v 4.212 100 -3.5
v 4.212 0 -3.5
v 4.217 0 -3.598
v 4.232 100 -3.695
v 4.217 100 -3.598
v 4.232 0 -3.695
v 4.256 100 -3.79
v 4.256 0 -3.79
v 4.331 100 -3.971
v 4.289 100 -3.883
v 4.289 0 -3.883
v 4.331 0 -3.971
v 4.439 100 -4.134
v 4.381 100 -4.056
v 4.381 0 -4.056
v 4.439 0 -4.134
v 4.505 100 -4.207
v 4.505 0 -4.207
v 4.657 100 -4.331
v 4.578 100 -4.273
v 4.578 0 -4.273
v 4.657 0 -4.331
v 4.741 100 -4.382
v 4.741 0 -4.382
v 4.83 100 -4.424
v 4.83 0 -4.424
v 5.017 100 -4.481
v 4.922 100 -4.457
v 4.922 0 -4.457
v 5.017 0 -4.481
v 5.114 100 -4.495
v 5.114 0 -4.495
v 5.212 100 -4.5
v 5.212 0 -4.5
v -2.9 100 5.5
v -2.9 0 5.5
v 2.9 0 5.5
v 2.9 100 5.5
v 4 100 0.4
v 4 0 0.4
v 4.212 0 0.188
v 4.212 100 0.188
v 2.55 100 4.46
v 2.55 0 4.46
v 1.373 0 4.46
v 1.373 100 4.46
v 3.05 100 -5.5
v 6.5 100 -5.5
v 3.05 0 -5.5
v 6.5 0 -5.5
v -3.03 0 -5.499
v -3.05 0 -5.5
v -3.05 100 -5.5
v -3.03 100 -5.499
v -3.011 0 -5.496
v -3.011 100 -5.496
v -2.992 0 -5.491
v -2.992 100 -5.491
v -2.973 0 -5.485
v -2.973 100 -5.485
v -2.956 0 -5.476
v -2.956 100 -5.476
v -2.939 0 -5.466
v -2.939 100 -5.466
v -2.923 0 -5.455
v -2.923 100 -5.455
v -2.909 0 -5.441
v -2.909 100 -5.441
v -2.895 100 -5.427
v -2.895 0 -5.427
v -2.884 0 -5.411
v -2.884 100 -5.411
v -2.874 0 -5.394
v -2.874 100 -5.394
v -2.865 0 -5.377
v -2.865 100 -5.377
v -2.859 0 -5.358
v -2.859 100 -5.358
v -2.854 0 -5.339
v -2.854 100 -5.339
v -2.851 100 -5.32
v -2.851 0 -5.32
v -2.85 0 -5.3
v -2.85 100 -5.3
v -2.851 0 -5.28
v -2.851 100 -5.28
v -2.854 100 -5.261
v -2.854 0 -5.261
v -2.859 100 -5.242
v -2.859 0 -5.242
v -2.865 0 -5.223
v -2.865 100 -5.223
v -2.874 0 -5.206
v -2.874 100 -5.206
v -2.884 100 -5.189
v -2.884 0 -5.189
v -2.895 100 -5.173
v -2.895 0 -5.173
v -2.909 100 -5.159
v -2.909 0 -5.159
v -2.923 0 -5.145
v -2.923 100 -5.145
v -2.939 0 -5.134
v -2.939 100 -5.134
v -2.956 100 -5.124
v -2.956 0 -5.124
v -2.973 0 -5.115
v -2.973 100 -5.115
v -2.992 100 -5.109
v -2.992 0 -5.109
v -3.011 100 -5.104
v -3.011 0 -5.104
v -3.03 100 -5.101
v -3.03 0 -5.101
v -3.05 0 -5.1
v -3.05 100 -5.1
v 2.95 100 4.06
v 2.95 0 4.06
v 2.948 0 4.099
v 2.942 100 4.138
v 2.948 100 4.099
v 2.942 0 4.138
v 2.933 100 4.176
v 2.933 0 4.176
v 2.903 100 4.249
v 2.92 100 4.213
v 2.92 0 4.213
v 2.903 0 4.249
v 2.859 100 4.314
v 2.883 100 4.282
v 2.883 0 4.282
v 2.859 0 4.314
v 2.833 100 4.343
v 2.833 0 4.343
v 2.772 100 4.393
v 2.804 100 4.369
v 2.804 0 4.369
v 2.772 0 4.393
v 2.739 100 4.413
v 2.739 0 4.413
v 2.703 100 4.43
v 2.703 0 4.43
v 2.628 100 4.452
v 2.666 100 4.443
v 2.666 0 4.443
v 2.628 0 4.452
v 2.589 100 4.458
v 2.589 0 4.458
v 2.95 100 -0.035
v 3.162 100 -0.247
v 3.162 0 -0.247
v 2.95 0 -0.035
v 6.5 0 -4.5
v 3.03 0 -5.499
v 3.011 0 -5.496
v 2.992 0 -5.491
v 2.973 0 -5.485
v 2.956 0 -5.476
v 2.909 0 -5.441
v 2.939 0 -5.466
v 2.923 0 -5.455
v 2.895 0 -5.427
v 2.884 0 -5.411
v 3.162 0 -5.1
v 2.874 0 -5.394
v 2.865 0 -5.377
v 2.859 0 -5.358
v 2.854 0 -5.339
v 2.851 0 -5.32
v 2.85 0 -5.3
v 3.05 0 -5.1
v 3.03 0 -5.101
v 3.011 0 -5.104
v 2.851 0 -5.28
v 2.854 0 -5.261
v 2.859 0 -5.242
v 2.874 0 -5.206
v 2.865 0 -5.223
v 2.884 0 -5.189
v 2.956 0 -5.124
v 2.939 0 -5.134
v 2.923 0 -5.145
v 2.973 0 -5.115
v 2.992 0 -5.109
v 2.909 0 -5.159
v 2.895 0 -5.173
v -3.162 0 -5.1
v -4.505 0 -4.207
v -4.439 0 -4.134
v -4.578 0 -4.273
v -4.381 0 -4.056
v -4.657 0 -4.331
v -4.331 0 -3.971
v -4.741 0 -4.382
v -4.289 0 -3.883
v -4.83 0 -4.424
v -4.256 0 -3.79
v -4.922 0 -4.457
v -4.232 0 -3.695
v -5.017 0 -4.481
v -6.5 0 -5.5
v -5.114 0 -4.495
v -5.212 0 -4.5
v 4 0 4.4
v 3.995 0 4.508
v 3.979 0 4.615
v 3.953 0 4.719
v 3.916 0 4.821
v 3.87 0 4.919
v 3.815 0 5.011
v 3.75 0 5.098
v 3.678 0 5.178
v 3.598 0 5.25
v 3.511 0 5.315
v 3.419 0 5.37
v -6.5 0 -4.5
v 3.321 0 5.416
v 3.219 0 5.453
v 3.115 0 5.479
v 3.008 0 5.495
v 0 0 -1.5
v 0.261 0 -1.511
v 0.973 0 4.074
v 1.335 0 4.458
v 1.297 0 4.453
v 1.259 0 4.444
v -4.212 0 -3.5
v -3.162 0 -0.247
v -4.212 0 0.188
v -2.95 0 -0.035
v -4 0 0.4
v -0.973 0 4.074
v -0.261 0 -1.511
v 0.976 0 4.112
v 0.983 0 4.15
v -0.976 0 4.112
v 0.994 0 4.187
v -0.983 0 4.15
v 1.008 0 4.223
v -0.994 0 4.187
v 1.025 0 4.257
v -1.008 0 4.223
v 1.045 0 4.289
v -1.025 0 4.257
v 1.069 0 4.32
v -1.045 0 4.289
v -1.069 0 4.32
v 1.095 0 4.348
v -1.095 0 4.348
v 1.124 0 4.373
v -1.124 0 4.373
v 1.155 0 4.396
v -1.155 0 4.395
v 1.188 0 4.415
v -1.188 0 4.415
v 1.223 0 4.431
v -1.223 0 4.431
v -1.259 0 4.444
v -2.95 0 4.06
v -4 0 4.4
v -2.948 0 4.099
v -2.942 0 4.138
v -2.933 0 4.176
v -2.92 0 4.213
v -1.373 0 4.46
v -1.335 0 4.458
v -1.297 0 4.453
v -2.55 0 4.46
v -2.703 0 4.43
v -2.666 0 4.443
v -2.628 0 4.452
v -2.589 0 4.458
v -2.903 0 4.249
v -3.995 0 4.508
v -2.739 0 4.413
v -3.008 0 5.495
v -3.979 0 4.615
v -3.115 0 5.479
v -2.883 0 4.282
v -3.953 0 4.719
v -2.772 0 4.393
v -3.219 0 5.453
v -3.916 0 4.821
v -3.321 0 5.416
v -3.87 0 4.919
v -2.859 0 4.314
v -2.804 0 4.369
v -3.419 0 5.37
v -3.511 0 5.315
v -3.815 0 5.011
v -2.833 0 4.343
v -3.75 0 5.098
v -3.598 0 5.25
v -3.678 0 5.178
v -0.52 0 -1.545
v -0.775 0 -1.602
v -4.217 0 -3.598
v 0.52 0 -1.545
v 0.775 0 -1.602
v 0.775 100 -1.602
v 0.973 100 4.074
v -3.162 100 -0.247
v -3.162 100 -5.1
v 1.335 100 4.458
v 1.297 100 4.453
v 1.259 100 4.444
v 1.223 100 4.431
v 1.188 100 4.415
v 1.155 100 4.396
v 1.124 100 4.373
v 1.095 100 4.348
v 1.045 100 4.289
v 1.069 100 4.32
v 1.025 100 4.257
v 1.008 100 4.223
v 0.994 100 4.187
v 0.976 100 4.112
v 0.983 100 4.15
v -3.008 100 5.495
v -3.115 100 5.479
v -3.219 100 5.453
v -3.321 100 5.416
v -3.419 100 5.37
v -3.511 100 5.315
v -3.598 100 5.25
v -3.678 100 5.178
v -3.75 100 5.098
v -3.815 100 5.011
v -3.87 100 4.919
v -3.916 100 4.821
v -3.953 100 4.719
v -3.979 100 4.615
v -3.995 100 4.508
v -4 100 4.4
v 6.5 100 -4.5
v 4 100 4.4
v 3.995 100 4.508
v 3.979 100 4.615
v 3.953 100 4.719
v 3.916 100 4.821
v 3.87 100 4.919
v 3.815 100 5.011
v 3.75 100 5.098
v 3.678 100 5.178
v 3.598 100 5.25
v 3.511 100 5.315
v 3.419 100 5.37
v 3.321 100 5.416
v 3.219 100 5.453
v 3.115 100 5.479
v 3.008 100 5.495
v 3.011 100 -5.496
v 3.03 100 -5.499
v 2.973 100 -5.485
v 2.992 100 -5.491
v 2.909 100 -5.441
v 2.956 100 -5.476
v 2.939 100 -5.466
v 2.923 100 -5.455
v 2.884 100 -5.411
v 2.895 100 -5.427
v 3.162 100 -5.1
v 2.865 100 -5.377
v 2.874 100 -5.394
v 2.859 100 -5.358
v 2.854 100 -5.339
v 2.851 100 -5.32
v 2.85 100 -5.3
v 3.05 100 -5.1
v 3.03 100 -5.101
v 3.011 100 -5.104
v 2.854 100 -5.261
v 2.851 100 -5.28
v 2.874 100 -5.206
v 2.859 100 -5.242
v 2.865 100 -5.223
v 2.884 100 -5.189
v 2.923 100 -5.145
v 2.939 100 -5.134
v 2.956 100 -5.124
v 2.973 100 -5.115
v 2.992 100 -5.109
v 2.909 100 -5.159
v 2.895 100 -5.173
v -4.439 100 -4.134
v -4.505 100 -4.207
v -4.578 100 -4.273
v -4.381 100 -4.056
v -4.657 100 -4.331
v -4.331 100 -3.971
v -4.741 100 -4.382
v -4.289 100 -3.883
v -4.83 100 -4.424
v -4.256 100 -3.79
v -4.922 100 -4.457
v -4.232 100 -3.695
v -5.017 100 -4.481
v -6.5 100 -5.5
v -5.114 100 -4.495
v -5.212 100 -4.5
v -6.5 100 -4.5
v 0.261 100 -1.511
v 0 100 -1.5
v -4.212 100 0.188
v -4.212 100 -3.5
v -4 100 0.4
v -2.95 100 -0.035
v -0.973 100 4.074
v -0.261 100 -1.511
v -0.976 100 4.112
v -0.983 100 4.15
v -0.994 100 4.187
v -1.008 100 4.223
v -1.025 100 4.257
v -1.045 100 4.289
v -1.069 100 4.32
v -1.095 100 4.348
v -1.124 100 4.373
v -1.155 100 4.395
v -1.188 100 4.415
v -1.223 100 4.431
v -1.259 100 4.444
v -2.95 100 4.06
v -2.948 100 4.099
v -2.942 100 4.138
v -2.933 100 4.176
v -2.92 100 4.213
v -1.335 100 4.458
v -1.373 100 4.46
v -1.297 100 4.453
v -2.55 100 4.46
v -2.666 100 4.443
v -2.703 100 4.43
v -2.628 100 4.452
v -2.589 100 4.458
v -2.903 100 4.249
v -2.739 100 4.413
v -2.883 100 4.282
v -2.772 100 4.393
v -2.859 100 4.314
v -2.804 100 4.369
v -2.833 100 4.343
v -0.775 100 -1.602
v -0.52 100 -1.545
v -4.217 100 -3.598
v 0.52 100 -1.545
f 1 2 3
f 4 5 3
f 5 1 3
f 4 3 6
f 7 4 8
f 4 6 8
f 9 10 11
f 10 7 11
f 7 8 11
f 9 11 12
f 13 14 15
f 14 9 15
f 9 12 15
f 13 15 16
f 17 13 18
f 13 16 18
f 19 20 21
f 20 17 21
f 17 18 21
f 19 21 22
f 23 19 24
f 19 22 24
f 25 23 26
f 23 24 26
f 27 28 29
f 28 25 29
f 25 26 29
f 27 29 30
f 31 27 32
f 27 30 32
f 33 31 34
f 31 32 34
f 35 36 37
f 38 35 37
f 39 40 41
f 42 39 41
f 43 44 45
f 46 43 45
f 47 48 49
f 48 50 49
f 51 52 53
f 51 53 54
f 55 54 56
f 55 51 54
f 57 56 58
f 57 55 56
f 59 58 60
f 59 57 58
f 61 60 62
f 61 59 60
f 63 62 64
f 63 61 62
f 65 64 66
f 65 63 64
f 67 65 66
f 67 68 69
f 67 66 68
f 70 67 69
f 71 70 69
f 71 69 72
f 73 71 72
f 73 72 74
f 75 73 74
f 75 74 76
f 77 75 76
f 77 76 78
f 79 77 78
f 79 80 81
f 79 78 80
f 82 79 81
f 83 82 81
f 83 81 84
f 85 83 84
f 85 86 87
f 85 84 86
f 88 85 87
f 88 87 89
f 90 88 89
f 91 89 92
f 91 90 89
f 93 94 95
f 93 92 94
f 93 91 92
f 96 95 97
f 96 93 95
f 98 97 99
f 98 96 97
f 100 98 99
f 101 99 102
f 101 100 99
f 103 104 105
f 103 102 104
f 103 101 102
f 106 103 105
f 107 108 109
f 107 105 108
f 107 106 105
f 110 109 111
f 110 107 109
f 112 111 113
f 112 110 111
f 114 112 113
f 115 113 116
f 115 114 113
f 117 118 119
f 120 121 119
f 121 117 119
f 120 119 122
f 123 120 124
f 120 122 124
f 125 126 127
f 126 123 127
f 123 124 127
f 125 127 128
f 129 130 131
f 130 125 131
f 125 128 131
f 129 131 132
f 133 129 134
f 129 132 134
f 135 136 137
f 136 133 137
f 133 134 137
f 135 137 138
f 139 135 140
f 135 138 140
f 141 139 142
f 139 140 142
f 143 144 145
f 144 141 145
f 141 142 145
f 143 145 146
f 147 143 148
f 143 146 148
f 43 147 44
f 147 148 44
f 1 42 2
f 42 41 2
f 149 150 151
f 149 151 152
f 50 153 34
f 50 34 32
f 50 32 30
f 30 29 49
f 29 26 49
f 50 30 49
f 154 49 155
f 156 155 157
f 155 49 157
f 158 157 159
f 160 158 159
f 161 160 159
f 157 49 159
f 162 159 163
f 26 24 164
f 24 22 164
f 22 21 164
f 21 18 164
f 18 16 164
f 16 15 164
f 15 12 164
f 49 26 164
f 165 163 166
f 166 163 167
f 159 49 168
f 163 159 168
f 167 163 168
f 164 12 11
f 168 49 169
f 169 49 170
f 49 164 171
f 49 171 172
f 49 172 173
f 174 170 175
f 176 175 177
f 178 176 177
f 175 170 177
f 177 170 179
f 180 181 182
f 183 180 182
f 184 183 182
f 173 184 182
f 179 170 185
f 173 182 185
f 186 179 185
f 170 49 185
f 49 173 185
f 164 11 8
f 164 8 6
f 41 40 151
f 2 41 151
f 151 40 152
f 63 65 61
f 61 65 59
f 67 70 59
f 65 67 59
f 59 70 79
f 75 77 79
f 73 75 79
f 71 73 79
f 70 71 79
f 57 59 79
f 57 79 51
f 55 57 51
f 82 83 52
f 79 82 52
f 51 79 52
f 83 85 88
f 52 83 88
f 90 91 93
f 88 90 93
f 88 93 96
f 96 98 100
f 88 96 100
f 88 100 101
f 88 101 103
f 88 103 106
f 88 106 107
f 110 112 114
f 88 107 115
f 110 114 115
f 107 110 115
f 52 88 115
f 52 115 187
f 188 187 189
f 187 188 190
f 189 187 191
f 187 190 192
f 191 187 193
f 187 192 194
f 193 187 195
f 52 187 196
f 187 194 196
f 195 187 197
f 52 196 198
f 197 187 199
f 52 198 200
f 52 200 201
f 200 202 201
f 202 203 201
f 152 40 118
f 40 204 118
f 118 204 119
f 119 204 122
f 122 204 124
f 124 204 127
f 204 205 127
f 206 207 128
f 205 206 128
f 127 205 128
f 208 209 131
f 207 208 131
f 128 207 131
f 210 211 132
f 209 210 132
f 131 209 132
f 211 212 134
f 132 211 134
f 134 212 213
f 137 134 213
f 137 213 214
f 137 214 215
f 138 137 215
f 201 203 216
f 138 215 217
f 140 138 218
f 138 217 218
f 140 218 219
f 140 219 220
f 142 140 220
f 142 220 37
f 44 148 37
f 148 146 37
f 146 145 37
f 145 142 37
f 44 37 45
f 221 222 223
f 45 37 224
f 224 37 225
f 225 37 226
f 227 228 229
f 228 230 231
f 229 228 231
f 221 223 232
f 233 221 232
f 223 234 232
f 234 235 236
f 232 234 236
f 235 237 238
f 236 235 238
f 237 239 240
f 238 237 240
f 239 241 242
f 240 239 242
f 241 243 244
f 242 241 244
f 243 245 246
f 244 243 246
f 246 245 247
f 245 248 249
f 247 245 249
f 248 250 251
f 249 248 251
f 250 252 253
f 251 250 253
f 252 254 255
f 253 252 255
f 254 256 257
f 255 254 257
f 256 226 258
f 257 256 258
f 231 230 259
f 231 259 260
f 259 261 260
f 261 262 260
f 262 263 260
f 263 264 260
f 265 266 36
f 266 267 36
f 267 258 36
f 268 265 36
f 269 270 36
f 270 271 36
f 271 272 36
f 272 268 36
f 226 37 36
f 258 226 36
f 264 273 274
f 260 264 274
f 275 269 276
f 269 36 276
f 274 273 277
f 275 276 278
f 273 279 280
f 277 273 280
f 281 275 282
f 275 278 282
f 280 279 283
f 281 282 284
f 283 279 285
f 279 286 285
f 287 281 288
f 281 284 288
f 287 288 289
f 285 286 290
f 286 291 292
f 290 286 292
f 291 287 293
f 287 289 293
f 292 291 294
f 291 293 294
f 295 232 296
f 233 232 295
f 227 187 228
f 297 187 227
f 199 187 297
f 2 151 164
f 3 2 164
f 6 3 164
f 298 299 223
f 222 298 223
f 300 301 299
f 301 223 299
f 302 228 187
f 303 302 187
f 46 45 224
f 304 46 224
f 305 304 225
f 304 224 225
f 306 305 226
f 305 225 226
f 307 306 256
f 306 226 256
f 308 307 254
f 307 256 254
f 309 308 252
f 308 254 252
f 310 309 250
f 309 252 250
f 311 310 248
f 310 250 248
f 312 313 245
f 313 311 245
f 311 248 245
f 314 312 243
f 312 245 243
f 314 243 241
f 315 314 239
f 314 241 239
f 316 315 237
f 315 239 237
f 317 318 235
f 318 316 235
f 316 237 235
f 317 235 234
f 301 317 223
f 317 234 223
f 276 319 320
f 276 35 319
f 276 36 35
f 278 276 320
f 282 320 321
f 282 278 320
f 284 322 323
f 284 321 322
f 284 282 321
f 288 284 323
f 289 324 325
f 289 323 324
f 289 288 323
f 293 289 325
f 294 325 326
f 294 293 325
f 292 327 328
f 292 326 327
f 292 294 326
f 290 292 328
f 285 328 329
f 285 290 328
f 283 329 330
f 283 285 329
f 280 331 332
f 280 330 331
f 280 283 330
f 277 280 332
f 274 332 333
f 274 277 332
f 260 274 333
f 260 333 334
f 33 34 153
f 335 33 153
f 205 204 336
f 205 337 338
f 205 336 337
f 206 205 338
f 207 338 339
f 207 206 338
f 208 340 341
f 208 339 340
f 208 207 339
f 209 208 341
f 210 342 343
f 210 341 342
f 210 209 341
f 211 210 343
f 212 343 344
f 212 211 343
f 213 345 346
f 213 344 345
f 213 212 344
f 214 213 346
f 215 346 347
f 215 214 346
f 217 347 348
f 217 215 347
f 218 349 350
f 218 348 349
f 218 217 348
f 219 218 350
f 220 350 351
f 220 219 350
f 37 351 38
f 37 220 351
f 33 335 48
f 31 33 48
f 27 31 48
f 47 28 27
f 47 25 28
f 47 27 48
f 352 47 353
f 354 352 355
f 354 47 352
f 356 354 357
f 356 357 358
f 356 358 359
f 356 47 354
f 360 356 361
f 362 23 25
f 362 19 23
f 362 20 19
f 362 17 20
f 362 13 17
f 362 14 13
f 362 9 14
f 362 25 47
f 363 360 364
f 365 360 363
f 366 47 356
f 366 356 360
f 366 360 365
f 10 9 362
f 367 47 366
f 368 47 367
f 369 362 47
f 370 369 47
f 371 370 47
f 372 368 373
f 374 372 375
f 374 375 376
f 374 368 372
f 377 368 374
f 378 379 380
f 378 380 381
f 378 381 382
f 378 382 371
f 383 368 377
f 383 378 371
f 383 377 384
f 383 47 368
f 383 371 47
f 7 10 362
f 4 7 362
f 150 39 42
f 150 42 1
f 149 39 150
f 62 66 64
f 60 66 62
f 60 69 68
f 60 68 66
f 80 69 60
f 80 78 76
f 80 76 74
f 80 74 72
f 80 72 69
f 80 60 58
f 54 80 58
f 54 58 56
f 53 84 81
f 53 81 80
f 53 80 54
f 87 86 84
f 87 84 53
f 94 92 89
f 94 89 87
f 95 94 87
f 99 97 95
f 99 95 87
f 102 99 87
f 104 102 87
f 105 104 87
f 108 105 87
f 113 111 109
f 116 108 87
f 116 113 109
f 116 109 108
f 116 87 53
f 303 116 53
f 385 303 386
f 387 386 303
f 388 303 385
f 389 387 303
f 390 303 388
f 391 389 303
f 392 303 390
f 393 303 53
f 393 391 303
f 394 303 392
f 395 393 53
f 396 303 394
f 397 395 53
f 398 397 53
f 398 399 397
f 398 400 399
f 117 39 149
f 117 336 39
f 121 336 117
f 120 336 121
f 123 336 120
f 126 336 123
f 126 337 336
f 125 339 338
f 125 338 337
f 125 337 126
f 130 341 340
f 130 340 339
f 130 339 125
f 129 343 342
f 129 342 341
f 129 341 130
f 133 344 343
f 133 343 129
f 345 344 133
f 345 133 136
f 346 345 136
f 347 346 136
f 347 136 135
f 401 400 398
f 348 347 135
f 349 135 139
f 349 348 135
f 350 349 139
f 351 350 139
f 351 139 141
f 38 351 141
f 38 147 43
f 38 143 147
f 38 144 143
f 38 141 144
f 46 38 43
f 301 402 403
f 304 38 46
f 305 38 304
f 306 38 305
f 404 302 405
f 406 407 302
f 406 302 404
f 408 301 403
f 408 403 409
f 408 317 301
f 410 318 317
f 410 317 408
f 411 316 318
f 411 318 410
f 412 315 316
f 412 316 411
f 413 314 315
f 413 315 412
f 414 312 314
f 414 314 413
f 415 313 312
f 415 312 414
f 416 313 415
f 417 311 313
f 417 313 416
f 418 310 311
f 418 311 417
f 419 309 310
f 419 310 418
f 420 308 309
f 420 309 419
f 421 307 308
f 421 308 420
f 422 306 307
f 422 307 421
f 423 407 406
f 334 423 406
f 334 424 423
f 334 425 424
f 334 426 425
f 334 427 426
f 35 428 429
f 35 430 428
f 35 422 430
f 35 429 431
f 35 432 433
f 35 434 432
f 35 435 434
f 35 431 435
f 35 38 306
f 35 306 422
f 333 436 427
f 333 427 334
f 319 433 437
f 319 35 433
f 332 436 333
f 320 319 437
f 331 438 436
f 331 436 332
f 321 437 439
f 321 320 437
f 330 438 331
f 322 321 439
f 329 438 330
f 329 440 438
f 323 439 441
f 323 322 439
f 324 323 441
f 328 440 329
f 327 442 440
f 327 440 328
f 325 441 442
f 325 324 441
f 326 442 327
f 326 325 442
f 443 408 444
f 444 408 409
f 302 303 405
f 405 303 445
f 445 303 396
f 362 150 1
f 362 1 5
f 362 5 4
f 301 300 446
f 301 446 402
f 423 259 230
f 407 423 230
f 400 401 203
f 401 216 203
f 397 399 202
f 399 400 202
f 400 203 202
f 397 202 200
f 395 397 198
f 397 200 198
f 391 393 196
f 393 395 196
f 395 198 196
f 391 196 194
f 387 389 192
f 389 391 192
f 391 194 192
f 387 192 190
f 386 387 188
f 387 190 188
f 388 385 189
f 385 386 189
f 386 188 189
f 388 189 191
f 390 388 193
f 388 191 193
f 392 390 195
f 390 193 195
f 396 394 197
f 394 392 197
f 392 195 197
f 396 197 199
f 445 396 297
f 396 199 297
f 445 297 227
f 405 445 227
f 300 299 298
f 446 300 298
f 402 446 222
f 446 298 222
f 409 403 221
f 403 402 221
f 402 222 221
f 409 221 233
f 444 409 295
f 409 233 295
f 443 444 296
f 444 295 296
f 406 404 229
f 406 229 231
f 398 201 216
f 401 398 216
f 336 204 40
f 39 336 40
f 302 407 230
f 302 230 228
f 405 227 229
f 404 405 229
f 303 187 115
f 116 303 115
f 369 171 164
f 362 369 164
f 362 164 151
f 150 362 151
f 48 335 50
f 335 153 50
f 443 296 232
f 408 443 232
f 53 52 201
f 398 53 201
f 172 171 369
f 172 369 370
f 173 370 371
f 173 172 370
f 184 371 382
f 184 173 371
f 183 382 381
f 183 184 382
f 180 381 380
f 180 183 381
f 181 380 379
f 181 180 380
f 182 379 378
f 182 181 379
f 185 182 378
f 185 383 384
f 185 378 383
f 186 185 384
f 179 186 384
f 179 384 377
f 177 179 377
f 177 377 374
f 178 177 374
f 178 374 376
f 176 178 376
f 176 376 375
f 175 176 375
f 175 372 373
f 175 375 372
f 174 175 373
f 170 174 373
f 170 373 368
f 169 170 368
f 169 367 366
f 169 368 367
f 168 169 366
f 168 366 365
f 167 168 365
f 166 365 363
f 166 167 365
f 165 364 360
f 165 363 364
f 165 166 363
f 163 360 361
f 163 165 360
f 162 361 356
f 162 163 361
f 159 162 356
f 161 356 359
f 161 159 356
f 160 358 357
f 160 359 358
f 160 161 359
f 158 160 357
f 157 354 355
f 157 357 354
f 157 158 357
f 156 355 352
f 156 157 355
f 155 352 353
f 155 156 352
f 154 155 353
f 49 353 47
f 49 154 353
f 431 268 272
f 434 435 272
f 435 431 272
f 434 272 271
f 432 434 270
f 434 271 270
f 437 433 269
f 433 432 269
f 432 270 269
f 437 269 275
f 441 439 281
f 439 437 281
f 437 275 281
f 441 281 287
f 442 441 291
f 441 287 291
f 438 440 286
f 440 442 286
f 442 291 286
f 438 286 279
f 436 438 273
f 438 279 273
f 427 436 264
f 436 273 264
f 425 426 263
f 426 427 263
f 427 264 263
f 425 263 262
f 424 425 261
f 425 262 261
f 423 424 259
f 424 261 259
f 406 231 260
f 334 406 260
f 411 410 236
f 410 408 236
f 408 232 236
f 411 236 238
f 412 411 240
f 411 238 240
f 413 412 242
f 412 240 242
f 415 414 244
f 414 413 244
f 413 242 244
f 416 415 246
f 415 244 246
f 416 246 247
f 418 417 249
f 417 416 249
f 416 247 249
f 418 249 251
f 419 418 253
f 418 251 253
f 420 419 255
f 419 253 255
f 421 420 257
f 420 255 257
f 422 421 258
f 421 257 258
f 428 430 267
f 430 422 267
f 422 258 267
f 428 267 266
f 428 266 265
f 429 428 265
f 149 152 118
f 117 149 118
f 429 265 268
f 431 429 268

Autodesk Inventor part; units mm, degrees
ref_plane "YZ Plane" through (0, 0, 0) normal (1, 0, 0) x (0, 1, 0)
ref_plane "Start Plane" through (0, 0, 0) normal (0, 1, 0) x (-1, 0, 0)
ref_plane "End Plane" through (0, 100, 0) normal (0, 1, 0) x (-1, 0, 0)
sketch "Sketch1" plane through (0, 0, 0) normal (0, 1, 0) x (-1, 0, 0)
  arc A0 (-3.05, -5.5) -> (-3.05, -5.1) centre (-3.05, -5.3) ccw
  line L0 (-3.05, -5.1) -> (-3.1625, -5.1)
  line L1 (-3.1625, -5.1) -> (-3.1625, -0.2474)
  line L2 (-3.1625, -0.2474) -> (-2.95, -0.0349)
  line L3 (-2.95, -0.0349) -> (-2.95, 4.06)
  arc A1 (-2.55, 4.46) -> (-2.95, 4.06) centre (-2.55, 4.06) ccw
  line L4 (-2.55, 4.46) -> (-1.373, 4.46)
  arc A2 (-0.9732, 4.074) -> (-1.373, 4.46) centre (-1.373, 4.06) ccw
  line L5 (-0.9732, 4.074) -> (-0.775, -1.6018)
  arc A3 (0.775, -1.6018) -> (-0.775, -1.6018) centre (0, -4.5) ccw
  line L6 (0.775, -1.6018) -> (0.9732, 4.074)
  arc A4 (1.373, 4.46) -> (0.9732, 4.074) centre (1.373, 4.06) ccw
  line L7 (1.373, 4.46) -> (2.55, 4.46)
  arc A5 (2.95, 4.06) -> (2.55, 4.46) centre (2.55, 4.06) ccw
  line L8 (2.95, 4.06) -> (2.95, -0.0349)
  line L9 (2.95, -0.0349) -> (3.1625, -0.2474)
  line L10 (3.1625, -0.2474) -> (3.1625, -5.1)
  line L11 (3.1625, -5.1) -> (3.05, -5.1)
  arc A6 (3.05, -5.1) -> (3.05, -5.5) centre (3.05, -5.3) ccw
  line L12 (3.05, -5.5) -> (6.5, -5.5)
  line L13 (6.5, -5.5) -> (6.5, -4.5)
  line L14 (6.5, -4.5) -> (5.2125, -4.5)
  arc A7 (4.2125, -3.5) -> (5.2125, -4.5) centre (5.2125, -3.5) ccw
  line L15 (4.2125, -3.5) -> (4.2125, 0.1875)
  line L16 (4.2125, 0.1875) -> (4, 0.4)
  line L17 (4, 0.4) -> (4, 4.4)
  arc A8 (4, 4.4) -> (2.9, 5.5) centre (2.9, 4.4) ccw
  line L18 (2.9, 5.5) -> (-2.9, 5.5)
  arc A9 (-2.9, 5.5) -> (-4, 4.4) centre (-2.9, 4.4) ccw
  line L19 (-4, 4.4) -> (-4, 0.4)
  line L20 (-4, 0.4) -> (-4.2125, 0.1875)
  line L21 (-4.2125, 0.1875) -> (-4.2125, -3.5)
  arc A10 (-5.2125, -4.5) -> (-4.2125, -3.5) centre (-5.2125, -3.5) ccw
  line L22 (-5.2125, -4.5) -> (-6.5, -4.5)
  line L23 (-6.5, -4.5) -> (-6.5, -5.5)
  line L24 (-6.5, -5.5) -> (-3.05, -5.5)
  point P0 (0, 0)
extrude "Body" add sketch "Sketch1" along normal up to surface (100 mm away) from surface at 0
sketch "Sketch2" plane through (0, 0, 0) normal (0, 1, 0) x (-1, 0, 0)
  line L0 (0, 0) -> (10, 0)
ref_plane "Work Plane3" through (0, 0, 0) normal (0, 0, -1) x (-1, 0, 0)
sketch "Sketch3" plane through (0, 0, 0) normal (0, 0, -1) x (-1, 0, 0)
  line L0 (-9.8, 0) -> (13.3, 0)
  line L1 (-9.8, 100) -> (13.3, 100)
  dimension "d7" = 100
equation "\"G_OFFSET_START\" = 0"
equation "\"G_OFFSET_END\" = 0"
equation "\"G_L\" = d7"
properties part number "13-106"
